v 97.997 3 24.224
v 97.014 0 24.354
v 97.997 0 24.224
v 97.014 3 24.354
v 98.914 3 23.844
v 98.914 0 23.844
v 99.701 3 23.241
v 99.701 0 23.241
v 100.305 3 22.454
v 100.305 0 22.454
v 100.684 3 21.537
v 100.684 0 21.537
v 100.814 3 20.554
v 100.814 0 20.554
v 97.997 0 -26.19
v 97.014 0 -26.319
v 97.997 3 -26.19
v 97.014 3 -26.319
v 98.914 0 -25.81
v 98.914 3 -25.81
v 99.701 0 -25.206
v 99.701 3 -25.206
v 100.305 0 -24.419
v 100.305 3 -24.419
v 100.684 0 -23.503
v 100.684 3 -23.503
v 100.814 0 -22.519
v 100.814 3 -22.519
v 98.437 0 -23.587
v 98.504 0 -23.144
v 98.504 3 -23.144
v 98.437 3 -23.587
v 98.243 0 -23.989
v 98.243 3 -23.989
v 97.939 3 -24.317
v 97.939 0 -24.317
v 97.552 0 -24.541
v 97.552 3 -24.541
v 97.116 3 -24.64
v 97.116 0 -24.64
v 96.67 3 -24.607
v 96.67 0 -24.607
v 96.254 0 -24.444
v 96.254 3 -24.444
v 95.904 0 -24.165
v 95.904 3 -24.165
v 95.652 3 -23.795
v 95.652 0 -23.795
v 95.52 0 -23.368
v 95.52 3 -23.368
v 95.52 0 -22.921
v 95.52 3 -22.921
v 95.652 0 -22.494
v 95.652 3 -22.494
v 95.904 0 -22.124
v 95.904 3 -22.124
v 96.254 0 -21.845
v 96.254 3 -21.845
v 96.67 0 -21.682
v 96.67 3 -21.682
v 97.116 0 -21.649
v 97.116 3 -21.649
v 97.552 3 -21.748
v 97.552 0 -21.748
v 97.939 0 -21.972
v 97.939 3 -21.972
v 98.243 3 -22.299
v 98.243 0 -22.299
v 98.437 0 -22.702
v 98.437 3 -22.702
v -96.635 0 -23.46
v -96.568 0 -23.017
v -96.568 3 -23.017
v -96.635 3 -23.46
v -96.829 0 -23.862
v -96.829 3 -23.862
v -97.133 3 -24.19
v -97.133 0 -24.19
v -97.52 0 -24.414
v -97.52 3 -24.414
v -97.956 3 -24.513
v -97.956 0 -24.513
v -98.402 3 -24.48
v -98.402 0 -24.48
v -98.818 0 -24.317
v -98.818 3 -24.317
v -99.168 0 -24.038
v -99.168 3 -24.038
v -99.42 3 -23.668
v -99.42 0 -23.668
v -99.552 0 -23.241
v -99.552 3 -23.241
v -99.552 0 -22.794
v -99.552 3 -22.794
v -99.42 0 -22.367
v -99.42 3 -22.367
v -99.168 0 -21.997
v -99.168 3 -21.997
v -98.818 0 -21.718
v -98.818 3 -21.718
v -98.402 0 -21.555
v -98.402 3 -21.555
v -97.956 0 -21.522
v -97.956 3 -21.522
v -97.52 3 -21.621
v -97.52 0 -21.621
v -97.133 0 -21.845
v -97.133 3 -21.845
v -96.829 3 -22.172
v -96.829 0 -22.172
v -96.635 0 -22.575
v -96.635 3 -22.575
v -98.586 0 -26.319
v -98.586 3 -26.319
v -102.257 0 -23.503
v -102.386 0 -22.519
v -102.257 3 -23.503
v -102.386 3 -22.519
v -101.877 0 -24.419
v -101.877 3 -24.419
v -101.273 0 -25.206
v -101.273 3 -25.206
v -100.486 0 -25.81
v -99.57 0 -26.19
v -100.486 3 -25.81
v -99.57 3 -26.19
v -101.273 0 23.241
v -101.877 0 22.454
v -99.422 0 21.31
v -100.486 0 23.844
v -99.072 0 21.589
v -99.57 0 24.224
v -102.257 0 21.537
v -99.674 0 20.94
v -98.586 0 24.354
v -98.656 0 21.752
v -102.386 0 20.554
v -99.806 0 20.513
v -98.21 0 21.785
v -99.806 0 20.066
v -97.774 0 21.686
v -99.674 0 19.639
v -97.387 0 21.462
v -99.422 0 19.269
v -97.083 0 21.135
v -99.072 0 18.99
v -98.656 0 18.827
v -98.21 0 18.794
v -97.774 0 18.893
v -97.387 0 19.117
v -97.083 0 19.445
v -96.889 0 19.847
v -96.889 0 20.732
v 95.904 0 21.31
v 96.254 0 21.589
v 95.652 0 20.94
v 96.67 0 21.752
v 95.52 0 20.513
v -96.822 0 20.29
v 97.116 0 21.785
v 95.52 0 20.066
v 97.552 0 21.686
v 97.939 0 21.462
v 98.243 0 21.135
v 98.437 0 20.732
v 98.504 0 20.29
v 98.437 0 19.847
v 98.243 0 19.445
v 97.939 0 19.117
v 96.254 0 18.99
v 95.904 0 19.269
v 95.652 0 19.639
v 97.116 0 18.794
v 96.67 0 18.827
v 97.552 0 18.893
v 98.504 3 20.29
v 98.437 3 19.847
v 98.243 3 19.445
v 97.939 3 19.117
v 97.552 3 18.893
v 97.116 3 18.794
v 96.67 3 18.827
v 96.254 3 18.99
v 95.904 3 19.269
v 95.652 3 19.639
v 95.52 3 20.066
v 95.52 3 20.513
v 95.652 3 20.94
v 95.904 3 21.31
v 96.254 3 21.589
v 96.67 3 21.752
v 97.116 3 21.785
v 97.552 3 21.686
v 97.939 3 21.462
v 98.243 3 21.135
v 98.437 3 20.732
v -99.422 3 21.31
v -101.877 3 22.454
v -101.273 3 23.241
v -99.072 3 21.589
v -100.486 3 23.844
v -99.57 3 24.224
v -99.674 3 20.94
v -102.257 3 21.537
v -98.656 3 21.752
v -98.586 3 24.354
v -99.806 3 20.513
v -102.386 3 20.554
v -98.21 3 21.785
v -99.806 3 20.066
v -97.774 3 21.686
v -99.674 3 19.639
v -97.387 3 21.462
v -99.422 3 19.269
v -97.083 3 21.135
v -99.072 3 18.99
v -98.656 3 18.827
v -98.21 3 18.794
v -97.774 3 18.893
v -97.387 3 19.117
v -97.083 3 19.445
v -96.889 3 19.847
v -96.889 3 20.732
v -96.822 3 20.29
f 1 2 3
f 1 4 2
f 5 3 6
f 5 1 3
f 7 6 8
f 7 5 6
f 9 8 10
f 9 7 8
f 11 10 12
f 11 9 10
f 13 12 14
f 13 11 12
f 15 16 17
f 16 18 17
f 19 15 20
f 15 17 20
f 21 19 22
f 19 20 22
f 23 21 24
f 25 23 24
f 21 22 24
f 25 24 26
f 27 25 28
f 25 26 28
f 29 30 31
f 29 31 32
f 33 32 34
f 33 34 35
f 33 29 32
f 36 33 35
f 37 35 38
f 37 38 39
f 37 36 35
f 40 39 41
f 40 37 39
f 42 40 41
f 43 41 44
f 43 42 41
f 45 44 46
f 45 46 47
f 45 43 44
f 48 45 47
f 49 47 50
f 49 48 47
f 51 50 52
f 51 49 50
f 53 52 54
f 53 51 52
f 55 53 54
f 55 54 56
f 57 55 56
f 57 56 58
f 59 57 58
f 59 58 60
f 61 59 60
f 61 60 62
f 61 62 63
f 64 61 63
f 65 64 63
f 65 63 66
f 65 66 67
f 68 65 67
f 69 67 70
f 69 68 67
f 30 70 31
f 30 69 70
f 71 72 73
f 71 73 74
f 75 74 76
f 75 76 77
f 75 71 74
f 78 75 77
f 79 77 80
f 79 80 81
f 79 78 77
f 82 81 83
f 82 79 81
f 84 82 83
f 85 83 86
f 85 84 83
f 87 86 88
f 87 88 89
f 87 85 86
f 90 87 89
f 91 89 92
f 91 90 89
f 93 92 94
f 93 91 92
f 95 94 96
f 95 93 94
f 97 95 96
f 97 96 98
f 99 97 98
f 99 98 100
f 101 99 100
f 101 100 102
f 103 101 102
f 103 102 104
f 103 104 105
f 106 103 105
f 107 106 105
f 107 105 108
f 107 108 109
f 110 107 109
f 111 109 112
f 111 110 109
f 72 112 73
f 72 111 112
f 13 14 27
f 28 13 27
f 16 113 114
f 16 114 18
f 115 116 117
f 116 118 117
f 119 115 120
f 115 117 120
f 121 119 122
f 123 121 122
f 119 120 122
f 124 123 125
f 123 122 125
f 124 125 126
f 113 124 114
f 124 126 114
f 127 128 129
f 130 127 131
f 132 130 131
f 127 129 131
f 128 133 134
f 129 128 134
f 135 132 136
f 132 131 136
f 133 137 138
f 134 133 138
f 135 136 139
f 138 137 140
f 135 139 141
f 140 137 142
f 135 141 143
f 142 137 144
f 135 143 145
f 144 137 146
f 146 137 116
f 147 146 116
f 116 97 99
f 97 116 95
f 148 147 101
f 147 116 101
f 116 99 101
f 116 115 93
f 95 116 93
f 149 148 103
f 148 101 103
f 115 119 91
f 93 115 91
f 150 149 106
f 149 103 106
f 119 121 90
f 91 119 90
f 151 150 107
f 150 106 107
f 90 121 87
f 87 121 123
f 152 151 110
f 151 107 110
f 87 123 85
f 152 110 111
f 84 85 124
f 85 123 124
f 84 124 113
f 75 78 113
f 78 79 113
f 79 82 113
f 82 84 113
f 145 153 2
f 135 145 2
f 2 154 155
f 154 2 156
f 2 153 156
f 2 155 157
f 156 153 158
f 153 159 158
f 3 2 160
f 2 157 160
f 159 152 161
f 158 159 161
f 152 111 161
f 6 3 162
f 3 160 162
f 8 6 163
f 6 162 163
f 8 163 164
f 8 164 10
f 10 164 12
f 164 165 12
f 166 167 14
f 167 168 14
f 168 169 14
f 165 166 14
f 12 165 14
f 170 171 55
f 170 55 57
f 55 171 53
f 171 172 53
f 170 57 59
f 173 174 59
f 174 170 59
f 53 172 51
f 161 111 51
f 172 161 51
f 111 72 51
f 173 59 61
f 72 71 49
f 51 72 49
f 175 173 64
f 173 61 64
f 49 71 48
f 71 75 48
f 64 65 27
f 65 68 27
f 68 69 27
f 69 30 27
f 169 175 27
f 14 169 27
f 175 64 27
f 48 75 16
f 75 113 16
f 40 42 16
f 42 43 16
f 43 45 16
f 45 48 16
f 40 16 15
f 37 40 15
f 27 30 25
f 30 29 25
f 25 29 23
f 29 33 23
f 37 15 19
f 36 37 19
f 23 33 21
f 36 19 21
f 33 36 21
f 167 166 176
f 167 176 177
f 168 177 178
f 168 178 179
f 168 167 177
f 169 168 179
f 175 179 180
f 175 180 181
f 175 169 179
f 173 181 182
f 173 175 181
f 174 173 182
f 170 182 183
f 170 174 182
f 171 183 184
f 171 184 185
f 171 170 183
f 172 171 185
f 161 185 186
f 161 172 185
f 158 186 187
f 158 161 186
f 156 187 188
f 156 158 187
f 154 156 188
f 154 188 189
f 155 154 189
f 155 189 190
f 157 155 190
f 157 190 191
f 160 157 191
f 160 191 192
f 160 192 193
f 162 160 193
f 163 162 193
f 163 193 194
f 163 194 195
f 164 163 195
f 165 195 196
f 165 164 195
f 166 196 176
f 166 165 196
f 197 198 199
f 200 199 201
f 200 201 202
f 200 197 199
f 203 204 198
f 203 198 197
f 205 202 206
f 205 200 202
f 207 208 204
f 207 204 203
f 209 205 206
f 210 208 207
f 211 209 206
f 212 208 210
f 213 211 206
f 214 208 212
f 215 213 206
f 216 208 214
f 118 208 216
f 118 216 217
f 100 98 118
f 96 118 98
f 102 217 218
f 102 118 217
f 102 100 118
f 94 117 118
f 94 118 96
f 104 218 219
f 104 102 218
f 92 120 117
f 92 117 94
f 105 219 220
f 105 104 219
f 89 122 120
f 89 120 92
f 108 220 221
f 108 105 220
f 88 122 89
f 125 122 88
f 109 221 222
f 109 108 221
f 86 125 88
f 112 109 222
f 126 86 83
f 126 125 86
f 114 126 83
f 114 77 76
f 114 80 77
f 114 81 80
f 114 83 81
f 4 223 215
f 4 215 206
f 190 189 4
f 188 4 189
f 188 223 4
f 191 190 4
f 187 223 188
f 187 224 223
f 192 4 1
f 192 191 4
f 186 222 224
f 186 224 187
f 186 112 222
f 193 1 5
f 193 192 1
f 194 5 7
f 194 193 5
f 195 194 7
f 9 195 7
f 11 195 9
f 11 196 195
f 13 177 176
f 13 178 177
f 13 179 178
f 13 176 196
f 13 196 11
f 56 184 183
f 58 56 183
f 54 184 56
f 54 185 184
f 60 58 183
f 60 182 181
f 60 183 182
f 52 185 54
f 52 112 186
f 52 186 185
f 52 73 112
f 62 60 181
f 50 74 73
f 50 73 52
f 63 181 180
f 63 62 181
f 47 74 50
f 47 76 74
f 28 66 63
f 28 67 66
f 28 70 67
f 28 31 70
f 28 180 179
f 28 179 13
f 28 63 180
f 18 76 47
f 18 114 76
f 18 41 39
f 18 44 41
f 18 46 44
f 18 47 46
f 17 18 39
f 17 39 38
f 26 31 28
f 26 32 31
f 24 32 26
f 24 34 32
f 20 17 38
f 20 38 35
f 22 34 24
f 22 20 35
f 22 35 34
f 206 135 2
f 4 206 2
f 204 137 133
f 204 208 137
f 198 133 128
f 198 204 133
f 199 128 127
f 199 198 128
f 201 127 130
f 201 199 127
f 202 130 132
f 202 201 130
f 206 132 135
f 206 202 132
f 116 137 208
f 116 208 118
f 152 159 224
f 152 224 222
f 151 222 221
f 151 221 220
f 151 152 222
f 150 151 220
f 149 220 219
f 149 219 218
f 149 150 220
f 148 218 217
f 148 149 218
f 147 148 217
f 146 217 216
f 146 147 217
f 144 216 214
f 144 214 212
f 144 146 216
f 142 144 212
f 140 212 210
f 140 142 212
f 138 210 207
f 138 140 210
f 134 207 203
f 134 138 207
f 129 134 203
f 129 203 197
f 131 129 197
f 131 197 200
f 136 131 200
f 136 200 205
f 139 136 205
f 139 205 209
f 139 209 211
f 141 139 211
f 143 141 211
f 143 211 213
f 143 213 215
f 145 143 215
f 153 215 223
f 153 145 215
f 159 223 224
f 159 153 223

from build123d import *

# Parameters (mm, degrees)
SKETCH_1_W      = 203.2
SKETCH_1_H      = 50.673
SKETCH_1_R      = 1.5
EXTRUDE_1_DEPTH = 3
FILLET_1_R      = 3.8


with BuildPart() as part:
    # 草图1 → 凸台-拉伸1 (new body)
    with BuildSketch(Plane(origin=(0, 0, 0), x_dir=(1, 0, 0), z_dir=(0, 1, 0))):
        with Locations((-0.786381305, 0.982976631)):
            Rectangle(SKETCH_1_W, SKETCH_1_H)
        with Locations((97.003618695, -20.289523369)):
            Circle(SKETCH_1_R, mode=Mode.SUBTRACT)
        with Locations((97.003618695, 23.144476631)):
            Circle(SKETCH_1_R, mode=Mode.SUBTRACT)
        with Locations((-98.068381305, 23.017476631)):
            Circle(SKETCH_1_R, mode=Mode.SUBTRACT)
        with Locations((-98.322381305, -20.289523369)):
            Circle(SKETCH_1_R, mode=Mode.SUBTRACT)
    extrude(amount=EXTRUDE_1_DEPTH)

    # 圆角1
    fillet_1_edges = [part.edges().sort_by_distance(p)[0] for p in [
        (-102.386381305, 1.5, 24.353523369),
        (-102.386381305, 1.5, -26.319476631),
        (100.813618695, 1.5, -26.319476631),
        (100.813618695, 1.5, 24.353523369),
    ]]
    fillet(fillet_1_edges, radius=FILLET_1_R)


solid = part.part
